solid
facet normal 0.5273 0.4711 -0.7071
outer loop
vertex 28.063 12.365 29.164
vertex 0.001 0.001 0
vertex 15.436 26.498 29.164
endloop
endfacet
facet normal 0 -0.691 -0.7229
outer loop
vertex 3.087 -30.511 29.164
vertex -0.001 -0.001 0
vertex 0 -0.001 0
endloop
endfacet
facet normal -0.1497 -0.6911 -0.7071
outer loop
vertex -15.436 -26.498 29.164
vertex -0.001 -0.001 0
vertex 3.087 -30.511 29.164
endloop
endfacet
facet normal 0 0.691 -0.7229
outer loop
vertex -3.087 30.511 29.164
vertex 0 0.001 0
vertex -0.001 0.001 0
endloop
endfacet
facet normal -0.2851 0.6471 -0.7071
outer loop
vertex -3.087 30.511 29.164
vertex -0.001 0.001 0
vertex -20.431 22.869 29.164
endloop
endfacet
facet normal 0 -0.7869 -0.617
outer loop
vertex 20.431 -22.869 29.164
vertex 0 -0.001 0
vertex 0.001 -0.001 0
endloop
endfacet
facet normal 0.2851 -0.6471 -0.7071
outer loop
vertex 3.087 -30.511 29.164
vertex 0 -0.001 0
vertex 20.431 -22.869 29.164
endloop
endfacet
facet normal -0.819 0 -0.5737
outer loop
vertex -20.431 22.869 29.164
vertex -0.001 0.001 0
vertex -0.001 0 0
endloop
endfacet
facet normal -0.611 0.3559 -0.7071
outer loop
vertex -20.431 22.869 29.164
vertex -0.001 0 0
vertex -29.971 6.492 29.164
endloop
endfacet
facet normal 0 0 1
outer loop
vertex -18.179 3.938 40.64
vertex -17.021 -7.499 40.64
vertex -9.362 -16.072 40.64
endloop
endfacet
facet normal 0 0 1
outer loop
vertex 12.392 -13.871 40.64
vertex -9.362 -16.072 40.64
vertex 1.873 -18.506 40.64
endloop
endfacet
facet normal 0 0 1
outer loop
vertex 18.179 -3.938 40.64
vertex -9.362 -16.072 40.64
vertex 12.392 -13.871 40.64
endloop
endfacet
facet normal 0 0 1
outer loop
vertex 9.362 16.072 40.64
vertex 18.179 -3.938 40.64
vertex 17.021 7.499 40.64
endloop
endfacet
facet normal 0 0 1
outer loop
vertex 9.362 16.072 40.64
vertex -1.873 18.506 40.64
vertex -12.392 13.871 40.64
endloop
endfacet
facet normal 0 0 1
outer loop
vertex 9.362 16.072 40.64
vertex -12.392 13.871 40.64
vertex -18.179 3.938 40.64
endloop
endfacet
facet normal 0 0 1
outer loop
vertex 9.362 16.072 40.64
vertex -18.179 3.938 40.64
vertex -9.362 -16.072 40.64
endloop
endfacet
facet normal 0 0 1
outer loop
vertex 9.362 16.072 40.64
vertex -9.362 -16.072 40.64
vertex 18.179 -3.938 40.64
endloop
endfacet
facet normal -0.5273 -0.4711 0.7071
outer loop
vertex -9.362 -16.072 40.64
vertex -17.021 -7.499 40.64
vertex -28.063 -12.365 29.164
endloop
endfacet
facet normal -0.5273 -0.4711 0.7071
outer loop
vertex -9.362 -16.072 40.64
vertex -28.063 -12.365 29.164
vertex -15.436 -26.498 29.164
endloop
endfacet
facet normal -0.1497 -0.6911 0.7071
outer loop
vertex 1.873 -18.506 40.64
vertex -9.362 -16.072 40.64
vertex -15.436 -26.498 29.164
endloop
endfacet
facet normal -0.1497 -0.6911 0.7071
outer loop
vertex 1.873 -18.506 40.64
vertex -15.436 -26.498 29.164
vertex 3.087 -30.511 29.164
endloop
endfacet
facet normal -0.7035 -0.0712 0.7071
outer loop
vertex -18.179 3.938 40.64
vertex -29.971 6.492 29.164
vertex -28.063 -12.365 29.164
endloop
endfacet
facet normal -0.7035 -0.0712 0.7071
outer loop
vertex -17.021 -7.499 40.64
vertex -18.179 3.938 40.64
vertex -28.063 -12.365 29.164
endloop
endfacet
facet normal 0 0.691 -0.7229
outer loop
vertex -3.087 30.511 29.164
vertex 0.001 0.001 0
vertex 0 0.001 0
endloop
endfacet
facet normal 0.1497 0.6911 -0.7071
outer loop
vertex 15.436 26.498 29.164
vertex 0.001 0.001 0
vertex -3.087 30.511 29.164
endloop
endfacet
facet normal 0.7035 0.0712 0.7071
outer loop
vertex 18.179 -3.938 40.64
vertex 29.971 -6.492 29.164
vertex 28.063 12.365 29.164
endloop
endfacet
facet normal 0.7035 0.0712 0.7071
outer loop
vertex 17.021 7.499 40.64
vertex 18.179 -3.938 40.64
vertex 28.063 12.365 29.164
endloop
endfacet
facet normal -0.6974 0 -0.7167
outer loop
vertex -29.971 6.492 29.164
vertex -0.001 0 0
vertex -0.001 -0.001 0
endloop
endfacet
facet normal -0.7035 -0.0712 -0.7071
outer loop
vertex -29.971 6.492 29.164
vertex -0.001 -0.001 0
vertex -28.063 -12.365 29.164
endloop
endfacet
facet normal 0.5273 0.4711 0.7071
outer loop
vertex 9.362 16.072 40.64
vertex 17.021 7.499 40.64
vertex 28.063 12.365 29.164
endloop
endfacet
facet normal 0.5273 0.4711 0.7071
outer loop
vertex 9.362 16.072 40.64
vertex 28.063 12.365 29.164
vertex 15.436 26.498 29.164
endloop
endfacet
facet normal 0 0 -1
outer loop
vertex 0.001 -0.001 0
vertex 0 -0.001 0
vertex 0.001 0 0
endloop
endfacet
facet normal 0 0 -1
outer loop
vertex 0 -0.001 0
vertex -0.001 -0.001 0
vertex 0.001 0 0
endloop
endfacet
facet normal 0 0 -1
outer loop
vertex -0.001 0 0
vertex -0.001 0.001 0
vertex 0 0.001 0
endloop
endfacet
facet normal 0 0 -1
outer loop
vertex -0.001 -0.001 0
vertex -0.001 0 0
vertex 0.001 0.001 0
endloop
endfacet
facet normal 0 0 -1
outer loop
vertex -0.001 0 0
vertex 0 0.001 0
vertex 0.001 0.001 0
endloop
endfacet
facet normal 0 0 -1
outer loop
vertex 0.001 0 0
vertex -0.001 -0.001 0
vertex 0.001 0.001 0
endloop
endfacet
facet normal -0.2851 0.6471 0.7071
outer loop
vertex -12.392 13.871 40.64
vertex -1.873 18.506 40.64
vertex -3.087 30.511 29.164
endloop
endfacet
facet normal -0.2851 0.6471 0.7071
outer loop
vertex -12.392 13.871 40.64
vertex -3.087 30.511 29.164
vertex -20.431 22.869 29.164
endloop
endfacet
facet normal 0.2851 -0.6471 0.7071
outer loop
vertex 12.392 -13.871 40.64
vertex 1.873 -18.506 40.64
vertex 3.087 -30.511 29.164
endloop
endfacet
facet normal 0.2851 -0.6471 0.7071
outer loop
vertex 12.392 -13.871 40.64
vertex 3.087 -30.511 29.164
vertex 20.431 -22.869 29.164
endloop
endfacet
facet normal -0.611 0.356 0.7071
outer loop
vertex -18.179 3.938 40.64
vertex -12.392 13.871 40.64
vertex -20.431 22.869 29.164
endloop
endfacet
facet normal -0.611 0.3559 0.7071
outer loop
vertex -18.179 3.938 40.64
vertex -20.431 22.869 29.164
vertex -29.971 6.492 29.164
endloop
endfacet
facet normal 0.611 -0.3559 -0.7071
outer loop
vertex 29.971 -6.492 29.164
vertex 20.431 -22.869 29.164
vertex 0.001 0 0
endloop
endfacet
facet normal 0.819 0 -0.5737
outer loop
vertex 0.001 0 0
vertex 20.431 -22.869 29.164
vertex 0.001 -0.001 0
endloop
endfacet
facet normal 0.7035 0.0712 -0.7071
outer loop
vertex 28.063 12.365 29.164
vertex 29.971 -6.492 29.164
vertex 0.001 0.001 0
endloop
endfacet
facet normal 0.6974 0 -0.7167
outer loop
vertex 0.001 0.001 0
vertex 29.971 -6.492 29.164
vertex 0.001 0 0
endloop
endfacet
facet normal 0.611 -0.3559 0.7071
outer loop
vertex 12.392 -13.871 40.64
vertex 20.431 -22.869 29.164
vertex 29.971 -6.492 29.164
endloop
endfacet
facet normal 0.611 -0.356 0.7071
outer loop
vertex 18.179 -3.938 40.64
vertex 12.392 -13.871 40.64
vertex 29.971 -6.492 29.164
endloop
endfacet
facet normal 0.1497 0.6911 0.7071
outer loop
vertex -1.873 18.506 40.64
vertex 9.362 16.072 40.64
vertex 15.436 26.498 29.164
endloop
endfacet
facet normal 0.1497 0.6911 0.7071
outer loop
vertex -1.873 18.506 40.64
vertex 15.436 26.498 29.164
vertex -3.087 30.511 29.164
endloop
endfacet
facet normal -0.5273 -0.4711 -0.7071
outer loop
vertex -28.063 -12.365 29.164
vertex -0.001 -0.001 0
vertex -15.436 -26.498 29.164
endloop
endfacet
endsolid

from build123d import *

# Parameters (mm, degrees)
F1_DEPTH     = 40.64
F2_SIZE      = 12.7
F3_T1_DEPTH  = 176.0479365306
F3_T3_DEPTH  = 176.0479365306
F3_T5_DEPTH  = 176.0479365306
F3_T7_DEPTH  = 176.0479365306
F3_T9_DEPTH  = 176.0479365306
F3_T11_DEPTH = 176.0479365306
F3_T13_DEPTH = 176.0479365306
F3_T15_DEPTH = 176.0479365306
F3_T17_DEPTH = 176.0479365306
F3_T19_DEPTH = 176.0479365306


# Not quite as in the source:
# - a fillet or chamfer that OpenCascade refuses, or shapes differently, is made with other operations: its cross-section is extruded or revolved along the edge and cut away or added


with BuildPart() as f1:
    # F0 (on Top) → F1 (new body)
    with BuildSketch(Plane.XY):
        Polygon((29.2412366164, 12.8835857291), (16.083875671, 27.6106074452), (-3.2169791099, 31.7913155674), (-21.2890572119, 23.8288216898), (-31.2294390474, 6.7645278386), (-29.2412366164, -12.8835857291), (-16.083875671, -27.6106074452), (3.2169791099, -31.7913155674), (21.2890572119, -23.8288216898), (31.2294390474, -6.7645278386), align=None)
    extrude(amount=F1_DEPTH)

    # F2
    f2_edges = [f1.edges().sort_by_distance(p)[0] for p in [
        (12.253018, -27.810069, 40.64),
        (26.259248, -15.296675, 40.64),
        (30.235338, 3.059529, 40.64),
        (22.662556, 20.247097, 40.64),
        (6.433448, 29.700962, 40.64),
        (-12.253018, 27.810069, 40.64),
        (-26.259248, 15.296675, 40.64),
        (-30.235338, -3.059529, 40.64),
        (-22.662556, -20.247097, 40.64),
        (-6.433448, -29.700962, 40.64),
    ]]
    chamfer(f2_edges, length=F2_SIZE)

    # F3: chamfer of 30.38856 on 10 edges, made by hand

    # F3_s2 → F3_t1 (cut)
    with BuildSketch(Plane(origin=(-86.0289159586, 18.6345004803, 0), x_dir=(0, 0, 1), z_dir=(0.9773351242, -0.2116980278, 0))):
        Polygon((0, 0.001181216), (30.38856, 30.389741216), (0, 30.389741216), align=None)
    extrude(amount=F3_T1_DEPTH, mode=Mode.SUBTRACT)

    # F3_s4 → F3_t3 (cut)
    with BuildSketch(Plane(origin=(8.8619339292, -87.5767384424, 0), x_dir=(0, 0, 1), z_dir=(-0.1006763738, 0.9949192268, 0))):
        Polygon((30.38856, 30.389741216), (0, 0.001181216), (0, 30.389741216), align=None)
    extrude(amount=F3_T3_DEPTH, mode=Mode.SUBTRACT)

    # F3_s6 → F3_t5 (cut)
    with BuildSketch(Plane(origin=(58.645770452, -65.6421556414, 0), x_dir=(0, 0, 1), z_dir=(-0.666247746, 0.7457304747, 0))):
        Polygon((0, 0.001181216), (30.38856, 30.389741216), (0, 30.389741216), align=None)
    extrude(amount=F3_T5_DEPTH, mode=Mode.SUBTRACT)

    # F3_s8 → F3_t7 (cut)
    with BuildSketch(Plane(origin=(86.0289159586, -18.6345004803, 0), x_dir=(0, 0, 1), z_dir=(-0.9773351242, 0.2116980278, 0))):
        Polygon((0, 0.001181216), (30.38856, 30.389741216), (0, 30.389741216), align=None)
    extrude(amount=F3_T7_DEPTH, mode=Mode.SUBTRACT)

    # F3_s10 → F3_t9 (cut)
    with BuildSketch(Plane(origin=(80.5519395843, 35.490900501, 0), x_dir=(0, 0, 1), z_dir=(-0.9151137034, -0.4031958704, 0))):
        Polygon((0, 0.001181216), (30.38856, 30.389741216), (0, 30.389741216), align=None)
    extrude(amount=F3_T9_DEPTH, mode=Mode.SUBTRACT)

    # F3_s12 → F3_t11 (cut)
    with BuildSketch(Plane(origin=(44.3068601486, 76.0599837822, 0), x_dir=(0, 0, 1), z_dir=(-0.5033499514, -0.8640826502, 0))):
        Polygon((0, 0.001181216), (30.38856, 30.389741216), (0, 30.389741216), align=None)
    extrude(amount=F3_T11_DEPTH, mode=Mode.SUBTRACT)

    # F3_s14 → F3_t13 (cut)
    with BuildSketch(Plane(origin=(-8.8619339292, 87.5767384424, 0), x_dir=(0, 0, 1), z_dir=(0.1006763738, -0.9949192268, 0))):
        Polygon((0, 0.001181216), (30.38856, 30.389741216), (0, 30.389741216), align=None)
    extrude(amount=F3_T13_DEPTH, mode=Mode.SUBTRACT)

    # F3_s16 → F3_t15 (cut)
    with BuildSketch(Plane(origin=(-58.645770452, 65.6421556414, 0), x_dir=(0, 0, 1), z_dir=(0.666247746, -0.7457304747, 0))):
        Polygon((0, 0.001181216), (30.38856, 30.389741216), (0, 30.389741216), align=None)
    extrude(amount=F3_T15_DEPTH, mode=Mode.SUBTRACT)

    # F3_s18 → F3_t17 (cut)
    with BuildSketch(Plane(origin=(-80.5519395843, -35.490900501, 0), x_dir=(0, 0, 1), z_dir=(0.9151137034, 0.4031958704, 0))):
        Polygon((0, 0.001181216), (30.38856, 30.389741216), (0, 30.389741216), align=None)
    extrude(amount=F3_T17_DEPTH, mode=Mode.SUBTRACT)

    # F3_s20 → F3_t19 (cut)
    with BuildSketch(Plane(origin=(-44.3068601486, -76.0599837822, 0), x_dir=(0, 0, 1), z_dir=(0.5033499514, 0.8640826502, 0))):
        Polygon((30.38856, 30.389741216), (0, 0.001181216), (0, 30.389741216), align=None)
    extrude(amount=F3_T19_DEPTH, mode=Mode.SUBTRACT)


solid = f1.part
